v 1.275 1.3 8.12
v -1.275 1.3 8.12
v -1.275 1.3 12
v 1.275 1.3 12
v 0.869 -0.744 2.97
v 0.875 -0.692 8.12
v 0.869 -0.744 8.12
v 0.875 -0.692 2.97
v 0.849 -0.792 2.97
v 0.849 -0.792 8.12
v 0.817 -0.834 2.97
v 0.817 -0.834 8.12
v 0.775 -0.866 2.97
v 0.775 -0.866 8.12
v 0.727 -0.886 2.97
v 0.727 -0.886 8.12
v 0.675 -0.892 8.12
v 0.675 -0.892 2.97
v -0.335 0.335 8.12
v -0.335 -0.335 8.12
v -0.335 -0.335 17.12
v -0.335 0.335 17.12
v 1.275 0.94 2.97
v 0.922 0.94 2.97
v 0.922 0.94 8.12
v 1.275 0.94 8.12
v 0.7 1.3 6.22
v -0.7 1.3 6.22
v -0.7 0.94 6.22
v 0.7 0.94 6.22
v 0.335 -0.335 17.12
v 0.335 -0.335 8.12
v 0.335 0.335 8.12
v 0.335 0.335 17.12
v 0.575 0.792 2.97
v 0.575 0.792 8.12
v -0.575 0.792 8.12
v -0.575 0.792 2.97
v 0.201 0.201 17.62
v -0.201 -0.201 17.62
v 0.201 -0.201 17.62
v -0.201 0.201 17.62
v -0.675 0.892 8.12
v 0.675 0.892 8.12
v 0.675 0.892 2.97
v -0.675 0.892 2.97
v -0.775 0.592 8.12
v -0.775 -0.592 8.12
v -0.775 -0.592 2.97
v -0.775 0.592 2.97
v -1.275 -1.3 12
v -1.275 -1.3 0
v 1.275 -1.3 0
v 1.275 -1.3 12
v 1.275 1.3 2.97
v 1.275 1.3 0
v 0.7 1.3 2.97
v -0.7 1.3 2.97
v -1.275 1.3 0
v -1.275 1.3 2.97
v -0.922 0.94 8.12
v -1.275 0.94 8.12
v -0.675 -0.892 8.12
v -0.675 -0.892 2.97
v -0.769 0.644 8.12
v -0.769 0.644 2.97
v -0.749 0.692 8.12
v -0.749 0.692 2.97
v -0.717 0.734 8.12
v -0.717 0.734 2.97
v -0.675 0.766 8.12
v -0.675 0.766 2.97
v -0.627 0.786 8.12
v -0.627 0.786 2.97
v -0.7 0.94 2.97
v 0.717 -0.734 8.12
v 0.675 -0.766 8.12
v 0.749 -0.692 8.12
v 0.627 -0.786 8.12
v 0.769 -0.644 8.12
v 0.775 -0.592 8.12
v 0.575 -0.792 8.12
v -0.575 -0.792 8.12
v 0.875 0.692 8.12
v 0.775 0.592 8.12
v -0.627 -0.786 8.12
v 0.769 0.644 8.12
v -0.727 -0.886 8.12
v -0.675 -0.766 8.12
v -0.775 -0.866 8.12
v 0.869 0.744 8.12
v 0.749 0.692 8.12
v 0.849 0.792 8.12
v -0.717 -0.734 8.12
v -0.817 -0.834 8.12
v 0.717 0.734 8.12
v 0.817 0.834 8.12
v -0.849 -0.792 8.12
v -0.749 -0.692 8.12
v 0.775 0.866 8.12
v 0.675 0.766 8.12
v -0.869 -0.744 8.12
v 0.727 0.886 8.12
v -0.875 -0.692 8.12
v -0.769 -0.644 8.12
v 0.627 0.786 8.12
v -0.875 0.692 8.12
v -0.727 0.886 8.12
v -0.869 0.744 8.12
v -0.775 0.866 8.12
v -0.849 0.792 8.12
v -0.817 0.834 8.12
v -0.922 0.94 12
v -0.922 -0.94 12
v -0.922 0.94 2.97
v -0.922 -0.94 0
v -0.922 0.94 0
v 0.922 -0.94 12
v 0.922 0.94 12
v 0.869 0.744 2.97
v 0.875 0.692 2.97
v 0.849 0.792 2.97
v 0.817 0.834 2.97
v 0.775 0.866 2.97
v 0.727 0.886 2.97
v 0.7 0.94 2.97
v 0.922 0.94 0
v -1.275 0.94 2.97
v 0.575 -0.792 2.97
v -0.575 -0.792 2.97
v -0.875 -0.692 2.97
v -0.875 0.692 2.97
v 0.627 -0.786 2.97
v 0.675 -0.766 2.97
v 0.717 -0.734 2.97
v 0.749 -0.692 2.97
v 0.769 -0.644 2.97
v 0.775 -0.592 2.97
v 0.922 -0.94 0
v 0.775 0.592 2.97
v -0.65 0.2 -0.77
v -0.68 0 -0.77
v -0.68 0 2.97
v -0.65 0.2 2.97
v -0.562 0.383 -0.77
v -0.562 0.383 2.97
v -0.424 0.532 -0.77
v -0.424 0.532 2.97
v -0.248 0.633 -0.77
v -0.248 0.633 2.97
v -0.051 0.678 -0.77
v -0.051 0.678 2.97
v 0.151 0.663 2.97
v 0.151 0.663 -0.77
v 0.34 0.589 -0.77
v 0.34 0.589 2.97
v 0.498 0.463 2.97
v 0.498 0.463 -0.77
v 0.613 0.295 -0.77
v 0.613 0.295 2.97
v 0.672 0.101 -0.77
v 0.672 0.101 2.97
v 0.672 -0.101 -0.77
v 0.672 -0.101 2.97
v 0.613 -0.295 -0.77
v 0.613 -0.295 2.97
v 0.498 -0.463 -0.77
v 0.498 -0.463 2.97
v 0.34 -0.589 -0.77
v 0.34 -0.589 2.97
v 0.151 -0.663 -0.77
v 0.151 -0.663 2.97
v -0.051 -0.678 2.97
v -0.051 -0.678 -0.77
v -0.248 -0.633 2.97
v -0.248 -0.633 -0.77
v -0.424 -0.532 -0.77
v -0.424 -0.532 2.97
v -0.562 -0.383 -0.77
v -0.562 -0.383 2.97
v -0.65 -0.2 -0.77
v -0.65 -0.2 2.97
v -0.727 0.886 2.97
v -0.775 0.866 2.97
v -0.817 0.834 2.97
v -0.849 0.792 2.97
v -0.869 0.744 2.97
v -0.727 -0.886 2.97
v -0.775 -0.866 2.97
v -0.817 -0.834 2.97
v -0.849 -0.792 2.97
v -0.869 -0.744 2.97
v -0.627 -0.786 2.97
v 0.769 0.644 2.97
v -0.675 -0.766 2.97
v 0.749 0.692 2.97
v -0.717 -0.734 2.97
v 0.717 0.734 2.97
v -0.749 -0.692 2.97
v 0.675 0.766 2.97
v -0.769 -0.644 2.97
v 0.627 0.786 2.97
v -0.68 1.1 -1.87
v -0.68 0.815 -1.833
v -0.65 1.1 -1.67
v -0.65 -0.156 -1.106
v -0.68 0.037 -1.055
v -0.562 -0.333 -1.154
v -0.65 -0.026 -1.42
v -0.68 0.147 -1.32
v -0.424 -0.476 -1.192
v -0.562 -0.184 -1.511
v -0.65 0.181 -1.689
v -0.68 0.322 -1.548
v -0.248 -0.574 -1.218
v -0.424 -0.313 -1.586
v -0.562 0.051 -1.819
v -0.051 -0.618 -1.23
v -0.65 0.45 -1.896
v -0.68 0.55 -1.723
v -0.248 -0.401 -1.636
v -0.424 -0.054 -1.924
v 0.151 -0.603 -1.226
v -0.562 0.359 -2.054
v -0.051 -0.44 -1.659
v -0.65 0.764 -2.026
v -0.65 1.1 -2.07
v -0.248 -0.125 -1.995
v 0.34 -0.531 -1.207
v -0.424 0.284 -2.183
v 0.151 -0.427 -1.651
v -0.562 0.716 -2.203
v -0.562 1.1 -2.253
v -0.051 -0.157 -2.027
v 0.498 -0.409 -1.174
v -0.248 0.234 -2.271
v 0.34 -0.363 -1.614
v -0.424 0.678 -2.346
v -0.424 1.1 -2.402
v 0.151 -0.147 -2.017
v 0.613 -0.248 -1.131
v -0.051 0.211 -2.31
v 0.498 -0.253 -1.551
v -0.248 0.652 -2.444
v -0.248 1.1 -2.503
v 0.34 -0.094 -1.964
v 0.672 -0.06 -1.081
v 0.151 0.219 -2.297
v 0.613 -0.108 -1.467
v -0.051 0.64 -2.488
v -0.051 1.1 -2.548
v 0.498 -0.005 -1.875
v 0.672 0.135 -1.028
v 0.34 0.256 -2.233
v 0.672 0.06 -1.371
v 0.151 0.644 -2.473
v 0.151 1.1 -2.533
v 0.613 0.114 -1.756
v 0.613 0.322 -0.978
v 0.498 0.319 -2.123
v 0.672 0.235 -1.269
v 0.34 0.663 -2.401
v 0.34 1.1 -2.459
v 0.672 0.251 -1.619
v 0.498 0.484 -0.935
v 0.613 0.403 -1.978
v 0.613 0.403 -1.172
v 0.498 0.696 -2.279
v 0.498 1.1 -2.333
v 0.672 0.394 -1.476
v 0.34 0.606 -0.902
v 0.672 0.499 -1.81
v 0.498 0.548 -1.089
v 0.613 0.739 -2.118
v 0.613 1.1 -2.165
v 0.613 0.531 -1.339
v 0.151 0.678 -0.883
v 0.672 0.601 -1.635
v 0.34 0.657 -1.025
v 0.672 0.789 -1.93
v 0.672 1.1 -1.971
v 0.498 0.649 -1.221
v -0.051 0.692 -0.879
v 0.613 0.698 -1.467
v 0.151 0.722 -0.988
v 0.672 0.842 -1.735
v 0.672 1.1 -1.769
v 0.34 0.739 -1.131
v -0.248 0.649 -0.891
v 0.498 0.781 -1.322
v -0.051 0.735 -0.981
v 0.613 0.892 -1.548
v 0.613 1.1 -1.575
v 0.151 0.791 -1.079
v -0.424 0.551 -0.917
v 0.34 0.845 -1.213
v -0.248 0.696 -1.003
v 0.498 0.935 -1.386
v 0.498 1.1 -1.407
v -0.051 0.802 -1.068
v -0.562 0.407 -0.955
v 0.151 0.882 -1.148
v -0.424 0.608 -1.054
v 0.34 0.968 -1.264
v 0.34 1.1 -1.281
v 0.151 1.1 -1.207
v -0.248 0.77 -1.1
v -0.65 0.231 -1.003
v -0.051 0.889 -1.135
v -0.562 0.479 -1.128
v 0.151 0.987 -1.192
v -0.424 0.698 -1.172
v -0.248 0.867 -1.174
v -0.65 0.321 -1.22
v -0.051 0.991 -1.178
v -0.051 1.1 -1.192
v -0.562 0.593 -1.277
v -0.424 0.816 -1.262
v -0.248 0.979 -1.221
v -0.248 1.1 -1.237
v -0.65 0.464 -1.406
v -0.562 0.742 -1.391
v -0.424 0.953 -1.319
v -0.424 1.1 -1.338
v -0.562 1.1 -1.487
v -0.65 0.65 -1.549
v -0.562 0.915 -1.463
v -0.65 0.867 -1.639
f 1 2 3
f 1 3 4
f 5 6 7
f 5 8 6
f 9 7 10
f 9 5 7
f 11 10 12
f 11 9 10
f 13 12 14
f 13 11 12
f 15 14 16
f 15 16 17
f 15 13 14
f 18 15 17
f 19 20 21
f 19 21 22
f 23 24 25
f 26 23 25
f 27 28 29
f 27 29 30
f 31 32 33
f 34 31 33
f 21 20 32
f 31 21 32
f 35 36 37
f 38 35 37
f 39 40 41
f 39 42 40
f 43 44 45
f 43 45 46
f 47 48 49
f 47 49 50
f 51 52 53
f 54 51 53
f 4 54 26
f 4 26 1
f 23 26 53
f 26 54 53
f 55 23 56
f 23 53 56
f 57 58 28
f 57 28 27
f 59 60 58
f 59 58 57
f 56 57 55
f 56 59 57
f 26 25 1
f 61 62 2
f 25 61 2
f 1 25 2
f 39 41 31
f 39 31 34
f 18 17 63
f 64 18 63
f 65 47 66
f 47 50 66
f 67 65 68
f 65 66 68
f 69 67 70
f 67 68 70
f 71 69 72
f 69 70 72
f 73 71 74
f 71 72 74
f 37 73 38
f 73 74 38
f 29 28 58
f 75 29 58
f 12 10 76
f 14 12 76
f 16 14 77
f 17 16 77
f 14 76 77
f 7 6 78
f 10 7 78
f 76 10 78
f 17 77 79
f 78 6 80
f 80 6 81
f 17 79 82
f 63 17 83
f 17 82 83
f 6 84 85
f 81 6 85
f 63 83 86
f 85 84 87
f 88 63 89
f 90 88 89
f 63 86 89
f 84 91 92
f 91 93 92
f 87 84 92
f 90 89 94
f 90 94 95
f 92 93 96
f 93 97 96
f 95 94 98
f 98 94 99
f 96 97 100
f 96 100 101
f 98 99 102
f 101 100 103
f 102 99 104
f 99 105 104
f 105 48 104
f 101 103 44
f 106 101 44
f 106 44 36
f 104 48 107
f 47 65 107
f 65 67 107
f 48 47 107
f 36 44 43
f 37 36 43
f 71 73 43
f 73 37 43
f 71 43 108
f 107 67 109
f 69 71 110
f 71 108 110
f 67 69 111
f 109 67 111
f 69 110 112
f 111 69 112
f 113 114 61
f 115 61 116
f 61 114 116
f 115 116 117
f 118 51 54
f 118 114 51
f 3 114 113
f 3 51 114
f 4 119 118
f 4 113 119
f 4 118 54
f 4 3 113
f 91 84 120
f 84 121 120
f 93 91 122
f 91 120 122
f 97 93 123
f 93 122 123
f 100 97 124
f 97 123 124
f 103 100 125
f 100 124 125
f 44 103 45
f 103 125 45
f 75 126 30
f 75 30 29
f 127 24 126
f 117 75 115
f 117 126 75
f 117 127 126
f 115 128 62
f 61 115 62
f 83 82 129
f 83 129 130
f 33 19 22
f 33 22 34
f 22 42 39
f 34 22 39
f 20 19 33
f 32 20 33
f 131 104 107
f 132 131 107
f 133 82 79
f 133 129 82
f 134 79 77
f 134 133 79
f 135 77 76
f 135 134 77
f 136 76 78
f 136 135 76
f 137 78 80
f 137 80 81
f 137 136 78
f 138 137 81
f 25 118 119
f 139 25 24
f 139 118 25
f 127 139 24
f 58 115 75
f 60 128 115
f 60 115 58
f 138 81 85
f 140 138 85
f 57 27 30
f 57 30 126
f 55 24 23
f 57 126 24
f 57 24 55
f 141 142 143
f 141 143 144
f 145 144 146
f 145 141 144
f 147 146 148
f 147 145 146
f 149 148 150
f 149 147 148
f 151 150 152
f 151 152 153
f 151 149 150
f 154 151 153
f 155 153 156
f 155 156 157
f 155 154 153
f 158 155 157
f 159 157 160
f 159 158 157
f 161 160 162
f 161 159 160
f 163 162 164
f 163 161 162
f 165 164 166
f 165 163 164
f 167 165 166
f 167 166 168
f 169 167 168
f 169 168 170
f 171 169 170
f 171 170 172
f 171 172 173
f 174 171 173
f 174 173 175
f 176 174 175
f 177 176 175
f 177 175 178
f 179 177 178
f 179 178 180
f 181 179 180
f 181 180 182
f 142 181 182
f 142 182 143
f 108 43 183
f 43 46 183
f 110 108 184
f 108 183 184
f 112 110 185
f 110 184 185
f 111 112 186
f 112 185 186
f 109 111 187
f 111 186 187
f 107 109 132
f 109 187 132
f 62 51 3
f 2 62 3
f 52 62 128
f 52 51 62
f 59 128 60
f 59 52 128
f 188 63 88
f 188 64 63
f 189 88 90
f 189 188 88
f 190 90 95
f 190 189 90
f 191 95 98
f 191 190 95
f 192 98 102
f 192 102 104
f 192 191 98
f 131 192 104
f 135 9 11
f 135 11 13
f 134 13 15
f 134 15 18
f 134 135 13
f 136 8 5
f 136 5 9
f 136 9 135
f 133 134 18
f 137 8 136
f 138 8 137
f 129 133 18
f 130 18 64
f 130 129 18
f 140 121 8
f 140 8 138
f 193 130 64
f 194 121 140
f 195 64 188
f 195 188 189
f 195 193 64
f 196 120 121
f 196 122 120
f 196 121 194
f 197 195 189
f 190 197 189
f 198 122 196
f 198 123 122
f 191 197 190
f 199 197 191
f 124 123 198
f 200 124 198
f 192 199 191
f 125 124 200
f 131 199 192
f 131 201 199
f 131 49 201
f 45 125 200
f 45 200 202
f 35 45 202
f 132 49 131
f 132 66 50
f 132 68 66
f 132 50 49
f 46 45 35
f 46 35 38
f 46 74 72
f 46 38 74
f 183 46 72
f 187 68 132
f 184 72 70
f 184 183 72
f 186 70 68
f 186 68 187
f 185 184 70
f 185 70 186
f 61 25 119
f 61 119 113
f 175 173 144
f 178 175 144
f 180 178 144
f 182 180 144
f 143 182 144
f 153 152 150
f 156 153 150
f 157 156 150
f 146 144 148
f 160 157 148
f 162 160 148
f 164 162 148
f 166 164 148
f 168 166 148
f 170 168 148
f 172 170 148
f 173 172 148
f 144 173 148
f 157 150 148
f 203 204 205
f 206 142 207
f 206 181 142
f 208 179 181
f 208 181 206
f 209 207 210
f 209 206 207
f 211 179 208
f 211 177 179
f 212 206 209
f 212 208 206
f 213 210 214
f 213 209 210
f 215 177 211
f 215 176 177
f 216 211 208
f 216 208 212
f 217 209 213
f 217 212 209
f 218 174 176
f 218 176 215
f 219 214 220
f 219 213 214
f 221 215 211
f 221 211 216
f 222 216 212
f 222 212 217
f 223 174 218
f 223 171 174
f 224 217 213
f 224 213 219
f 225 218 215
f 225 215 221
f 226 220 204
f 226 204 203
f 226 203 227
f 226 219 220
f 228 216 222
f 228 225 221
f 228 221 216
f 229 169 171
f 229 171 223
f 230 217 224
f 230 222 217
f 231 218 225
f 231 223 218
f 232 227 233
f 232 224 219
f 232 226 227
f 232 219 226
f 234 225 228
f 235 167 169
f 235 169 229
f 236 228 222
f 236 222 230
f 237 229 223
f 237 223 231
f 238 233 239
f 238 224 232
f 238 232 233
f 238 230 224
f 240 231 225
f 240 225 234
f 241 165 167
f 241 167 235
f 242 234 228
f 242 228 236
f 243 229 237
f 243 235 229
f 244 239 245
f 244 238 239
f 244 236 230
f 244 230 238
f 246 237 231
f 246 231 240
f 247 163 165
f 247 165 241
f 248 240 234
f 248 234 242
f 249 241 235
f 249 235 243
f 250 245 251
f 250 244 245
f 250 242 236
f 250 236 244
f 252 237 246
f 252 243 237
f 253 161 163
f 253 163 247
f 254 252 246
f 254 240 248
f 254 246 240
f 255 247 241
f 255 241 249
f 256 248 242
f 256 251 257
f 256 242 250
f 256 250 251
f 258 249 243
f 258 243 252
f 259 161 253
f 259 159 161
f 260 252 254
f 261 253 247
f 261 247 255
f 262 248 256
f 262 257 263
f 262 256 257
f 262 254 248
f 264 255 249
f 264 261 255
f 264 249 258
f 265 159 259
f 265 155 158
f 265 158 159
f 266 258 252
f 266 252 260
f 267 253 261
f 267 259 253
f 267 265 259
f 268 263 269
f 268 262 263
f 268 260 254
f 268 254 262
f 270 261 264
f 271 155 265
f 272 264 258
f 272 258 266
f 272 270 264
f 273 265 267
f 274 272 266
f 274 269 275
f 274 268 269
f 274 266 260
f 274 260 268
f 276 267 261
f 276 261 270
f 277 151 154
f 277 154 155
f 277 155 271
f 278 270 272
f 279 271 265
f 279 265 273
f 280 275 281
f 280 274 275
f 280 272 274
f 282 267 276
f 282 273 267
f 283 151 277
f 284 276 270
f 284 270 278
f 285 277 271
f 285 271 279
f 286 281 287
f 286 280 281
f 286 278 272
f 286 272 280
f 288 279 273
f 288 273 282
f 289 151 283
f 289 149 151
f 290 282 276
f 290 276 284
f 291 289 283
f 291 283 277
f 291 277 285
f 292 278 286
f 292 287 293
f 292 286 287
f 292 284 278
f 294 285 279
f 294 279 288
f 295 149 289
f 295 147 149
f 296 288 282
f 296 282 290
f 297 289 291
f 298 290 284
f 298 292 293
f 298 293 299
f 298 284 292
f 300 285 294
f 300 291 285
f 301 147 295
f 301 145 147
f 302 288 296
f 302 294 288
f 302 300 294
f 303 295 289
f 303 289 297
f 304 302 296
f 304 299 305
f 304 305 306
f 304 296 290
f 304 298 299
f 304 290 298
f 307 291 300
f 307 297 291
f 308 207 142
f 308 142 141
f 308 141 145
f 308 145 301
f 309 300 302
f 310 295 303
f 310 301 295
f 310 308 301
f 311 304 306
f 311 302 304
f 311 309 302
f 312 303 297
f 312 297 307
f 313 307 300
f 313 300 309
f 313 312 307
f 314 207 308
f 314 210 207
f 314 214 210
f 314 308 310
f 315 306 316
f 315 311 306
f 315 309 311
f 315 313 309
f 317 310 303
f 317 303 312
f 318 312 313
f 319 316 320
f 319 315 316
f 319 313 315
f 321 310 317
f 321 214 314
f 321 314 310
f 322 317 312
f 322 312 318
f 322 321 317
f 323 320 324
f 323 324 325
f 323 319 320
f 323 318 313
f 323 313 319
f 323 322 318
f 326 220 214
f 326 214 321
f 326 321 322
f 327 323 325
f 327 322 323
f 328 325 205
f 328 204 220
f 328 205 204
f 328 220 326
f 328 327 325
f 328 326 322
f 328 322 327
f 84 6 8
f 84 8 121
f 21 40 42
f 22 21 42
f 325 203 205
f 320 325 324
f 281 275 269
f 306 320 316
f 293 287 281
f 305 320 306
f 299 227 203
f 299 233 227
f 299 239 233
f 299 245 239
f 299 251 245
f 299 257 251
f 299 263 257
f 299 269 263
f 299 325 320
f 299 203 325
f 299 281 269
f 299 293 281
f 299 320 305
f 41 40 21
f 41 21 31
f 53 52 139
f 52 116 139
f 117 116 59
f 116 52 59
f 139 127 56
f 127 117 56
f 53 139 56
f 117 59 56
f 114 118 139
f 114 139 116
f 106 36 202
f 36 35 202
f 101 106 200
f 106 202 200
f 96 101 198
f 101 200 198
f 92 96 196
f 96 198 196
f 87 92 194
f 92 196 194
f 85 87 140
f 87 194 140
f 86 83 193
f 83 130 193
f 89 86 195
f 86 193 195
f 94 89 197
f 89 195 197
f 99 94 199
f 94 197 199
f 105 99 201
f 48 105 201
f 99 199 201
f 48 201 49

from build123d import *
from OCP.BRepFilletAPI import BRepFilletAPI_MakeChamfer

# Parameters (mm, degrees)
SKETCH1_W           = 2.55
SKETCH1_H           = 2.6
SKETCH1_W_2         = 0.99
SKETCH1_H_2         = 1.04
BOSS_EXTRUDE1_DEPTH = 12
CUT_EXTRUDE1_REACH  = 14.337
SKETCH2_W           = 5.15
SKETCH2_H           = 0.36
SKETCH3_W           = 1.843846154
SKETCH3_H           = 1.88
CUT_EXTRUDE2_DEPTH  = 12
SKETCH4_W           = 1.4
SKETCH4_H           = 3.25
BOSS_EXTRUDE2_DEPTH = 0.36
SKETCH5_W           = 1.750648116
SKETCH5_H           = 1.78497455
SKETCH5_W_2         = 1.550648116
SKETCH5_H_2         = 1.58497455
BOSS_EXTRUDE3_DEPTH = 5.15
FILLET1_R           = 0.2
FILLET2_R           = 0.2
SKETCH7_R           = 0.68
SKETCH8_W           = 0.67
SKETCH8_H           = 0.67
BOSS_EXTRUDE4_DEPTH = 9.5
CHAMFER1_SIZE       = 0.5
CHAMFER1_SIZE2      = 0.133974596


with BuildPart() as part:
    # Sketch1 → Boss-Extrude1 (new body)
    with BuildSketch(Plane.XY):
        Rectangle(SKETCH1_W, SKETCH1_H)
        Rectangle(SKETCH1_W_2, SKETCH1_H_2, mode=Mode.SUBTRACT)
    extrude(amount=BOSS_EXTRUDE1_DEPTH)

    # Sketch2 → Cut-Extrude1 (cut, up to next)
    with BuildSketch(Plane.ZY.offset(1.275), mode=Mode.PRIVATE) as cut_extrude1_sk1:
        with Locations((5.545, 1.12)):
            Rectangle(SKETCH2_W, SKETCH2_H)
    cut_extrude1_tool1 = extrude(cut_extrude1_sk1.sketch, amount=-CUT_EXTRUDE1_REACH, mode=Mode.PRIVATE) & part.part
    add(cut_extrude1_tool1.solids().sort_by_distance((-1.275, 1.12, 5.545))[0], mode=Mode.SUBTRACT)

    # Sketch3 → Cut-Extrude2 (cut)
    with BuildSketch(Plane(origin=(0, 0, 0), x_dir=(-1, 0, 0), z_dir=(0, 0, -1))):
        Rectangle(SKETCH3_W, SKETCH3_H)
    extrude(amount=-CUT_EXTRUDE2_DEPTH, mode=Mode.SUBTRACT)

    # Sketch4 → Boss-Extrude2 (add)
    with BuildSketch(Plane(origin=(0, 1.3, 0), x_dir=(1, 0, 0), z_dir=(0, 1, 0))):
        with Locations((0, -4.595)):
            Rectangle(SKETCH4_W, SKETCH4_H)
    extrude(amount=-BOSS_EXTRUDE2_DEPTH)


with BuildPart() as body_2:
    # Sketch5 → Boss-Extrude3 (new body)
    with BuildSketch(Plane(origin=(0, 0, 8.12), x_dir=(-1, 0, 0), z_dir=(0, 0, -1))):
        Rectangle(SKETCH5_W, SKETCH5_H)
        Rectangle(SKETCH5_W_2, SKETCH5_H_2, mode=Mode.SUBTRACT)
    extrude(amount=BOSS_EXTRUDE3_DEPTH)

    # Fillet1
    fillet1_edges = [body_2.edges().sort_by_distance(p)[0] for p in [
        (-0.775324058, 0.792487275, 5.545),
        (0.775324058, 0.792487275, 5.545),
        (-0.775324058, -0.792487275, 5.545),
        (0.775324058, -0.792487275, 5.545),
    ]]
    fillet(fillet1_edges, radius=FILLET1_R)

    # Fillet2
    fillet2_edges = [body_2.edges().sort_by_distance(p)[0] for p in [
        (0.875324058, 0.892487275, 5.545),
        (-0.875324058, 0.892487275, 5.545),
        (-0.875324058, -0.892487275, 5.545),
        (0.875324058, -0.892487275, 5.545),
    ]]
    fillet(fillet2_edges, radius=FILLET2_R)


with BuildPart() as body_3:
    # Sweep2: sweep along a path in Sketch6
    with BuildLine(Plane(origin=(0, 0, 0), x_dir=(0, 0, -1), z_dir=(1, 0, 0))) as sweep2_path:
        Line((-2.97, 0), (0.769827469, 0))
        ThreePointArc((0.769827469, 0), (1.547766926, 0.322233074), (1.87, 1.100172531))
    # Sketch7 → Sweep2 (sweep)
    with BuildSketch(Plane(origin=(0, 0, 2.97), x_dir=(-1, 0, 0), z_dir=(0, 0, -1))):
        Circle(SKETCH7_R)
    sweep(path=sweep2_path.line)


with BuildPart() as body_4:
    # Sketch8 → Boss-Extrude4 (new body)
    with BuildSketch(Plane.XY.offset(8.12)):
        Rectangle(SKETCH8_W, SKETCH8_H)
    extrude(amount=BOSS_EXTRUDE4_DEPTH)

    # Chamfer1: one chamfer whose edges measure the first distance from different faces: ONE call of the kernel's chamfer builder (chamfer() names one face for all edges)
    chamfer1_edges_1 = [body_4.edges().sort_by_distance(p)[0] for p in [
        (0, -0.335, 17.62),
    ]]
    chamfer1_side_1 = [body_4.faces().sort_by_distance(p)[0] for p in [
        (0, -0.335, 12.87),
    ]]
    chamfer1_edges_2 = [body_4.edges().sort_by_distance(p)[0] for p in [
        (0.335, 0, 17.62),
    ]]
    chamfer1_side_2 = [body_4.faces().sort_by_distance(p)[0] for p in [
        (0.335, 0, 12.87),
    ]]
    chamfer1_edges_3 = [body_4.edges().sort_by_distance(p)[0] for p in [
        (0, 0.335, 17.62),
    ]]
    chamfer1_side_3 = [body_4.faces().sort_by_distance(p)[0] for p in [
        (0, 0.335, 12.87),
    ]]
    chamfer1_edges_4 = [body_4.edges().sort_by_distance(p)[0] for p in [
        (-0.335, 0, 17.62),
    ]]
    chamfer1_side_4 = [body_4.faces().sort_by_distance(p)[0] for p in [
        (-0.335, 0, 12.87),
    ]]
    chamfer1 = BRepFilletAPI_MakeChamfer(body_4.part.solid().wrapped)
    for e in chamfer1_edges_1:
        chamfer1.Add(CHAMFER1_SIZE, CHAMFER1_SIZE2, e.wrapped, chamfer1_side_1[0].wrapped)  # the first distance lies on this face
    for e in chamfer1_edges_2:
        chamfer1.Add(CHAMFER1_SIZE, CHAMFER1_SIZE2, e.wrapped, chamfer1_side_2[0].wrapped)  # the first distance lies on this face
    for e in chamfer1_edges_3:
        chamfer1.Add(CHAMFER1_SIZE, CHAMFER1_SIZE2, e.wrapped, chamfer1_side_3[0].wrapped)  # the first distance lies on this face
    for e in chamfer1_edges_4:
        chamfer1.Add(CHAMFER1_SIZE, CHAMFER1_SIZE2, e.wrapped, chamfer1_side_4[0].wrapped)  # the first distance lies on this face
    add(Compound.cast(chamfer1.Shape()), mode=Mode.REPLACE)


solid = Compound([part.part, body_2.part, body_3.part, body_4.part])
